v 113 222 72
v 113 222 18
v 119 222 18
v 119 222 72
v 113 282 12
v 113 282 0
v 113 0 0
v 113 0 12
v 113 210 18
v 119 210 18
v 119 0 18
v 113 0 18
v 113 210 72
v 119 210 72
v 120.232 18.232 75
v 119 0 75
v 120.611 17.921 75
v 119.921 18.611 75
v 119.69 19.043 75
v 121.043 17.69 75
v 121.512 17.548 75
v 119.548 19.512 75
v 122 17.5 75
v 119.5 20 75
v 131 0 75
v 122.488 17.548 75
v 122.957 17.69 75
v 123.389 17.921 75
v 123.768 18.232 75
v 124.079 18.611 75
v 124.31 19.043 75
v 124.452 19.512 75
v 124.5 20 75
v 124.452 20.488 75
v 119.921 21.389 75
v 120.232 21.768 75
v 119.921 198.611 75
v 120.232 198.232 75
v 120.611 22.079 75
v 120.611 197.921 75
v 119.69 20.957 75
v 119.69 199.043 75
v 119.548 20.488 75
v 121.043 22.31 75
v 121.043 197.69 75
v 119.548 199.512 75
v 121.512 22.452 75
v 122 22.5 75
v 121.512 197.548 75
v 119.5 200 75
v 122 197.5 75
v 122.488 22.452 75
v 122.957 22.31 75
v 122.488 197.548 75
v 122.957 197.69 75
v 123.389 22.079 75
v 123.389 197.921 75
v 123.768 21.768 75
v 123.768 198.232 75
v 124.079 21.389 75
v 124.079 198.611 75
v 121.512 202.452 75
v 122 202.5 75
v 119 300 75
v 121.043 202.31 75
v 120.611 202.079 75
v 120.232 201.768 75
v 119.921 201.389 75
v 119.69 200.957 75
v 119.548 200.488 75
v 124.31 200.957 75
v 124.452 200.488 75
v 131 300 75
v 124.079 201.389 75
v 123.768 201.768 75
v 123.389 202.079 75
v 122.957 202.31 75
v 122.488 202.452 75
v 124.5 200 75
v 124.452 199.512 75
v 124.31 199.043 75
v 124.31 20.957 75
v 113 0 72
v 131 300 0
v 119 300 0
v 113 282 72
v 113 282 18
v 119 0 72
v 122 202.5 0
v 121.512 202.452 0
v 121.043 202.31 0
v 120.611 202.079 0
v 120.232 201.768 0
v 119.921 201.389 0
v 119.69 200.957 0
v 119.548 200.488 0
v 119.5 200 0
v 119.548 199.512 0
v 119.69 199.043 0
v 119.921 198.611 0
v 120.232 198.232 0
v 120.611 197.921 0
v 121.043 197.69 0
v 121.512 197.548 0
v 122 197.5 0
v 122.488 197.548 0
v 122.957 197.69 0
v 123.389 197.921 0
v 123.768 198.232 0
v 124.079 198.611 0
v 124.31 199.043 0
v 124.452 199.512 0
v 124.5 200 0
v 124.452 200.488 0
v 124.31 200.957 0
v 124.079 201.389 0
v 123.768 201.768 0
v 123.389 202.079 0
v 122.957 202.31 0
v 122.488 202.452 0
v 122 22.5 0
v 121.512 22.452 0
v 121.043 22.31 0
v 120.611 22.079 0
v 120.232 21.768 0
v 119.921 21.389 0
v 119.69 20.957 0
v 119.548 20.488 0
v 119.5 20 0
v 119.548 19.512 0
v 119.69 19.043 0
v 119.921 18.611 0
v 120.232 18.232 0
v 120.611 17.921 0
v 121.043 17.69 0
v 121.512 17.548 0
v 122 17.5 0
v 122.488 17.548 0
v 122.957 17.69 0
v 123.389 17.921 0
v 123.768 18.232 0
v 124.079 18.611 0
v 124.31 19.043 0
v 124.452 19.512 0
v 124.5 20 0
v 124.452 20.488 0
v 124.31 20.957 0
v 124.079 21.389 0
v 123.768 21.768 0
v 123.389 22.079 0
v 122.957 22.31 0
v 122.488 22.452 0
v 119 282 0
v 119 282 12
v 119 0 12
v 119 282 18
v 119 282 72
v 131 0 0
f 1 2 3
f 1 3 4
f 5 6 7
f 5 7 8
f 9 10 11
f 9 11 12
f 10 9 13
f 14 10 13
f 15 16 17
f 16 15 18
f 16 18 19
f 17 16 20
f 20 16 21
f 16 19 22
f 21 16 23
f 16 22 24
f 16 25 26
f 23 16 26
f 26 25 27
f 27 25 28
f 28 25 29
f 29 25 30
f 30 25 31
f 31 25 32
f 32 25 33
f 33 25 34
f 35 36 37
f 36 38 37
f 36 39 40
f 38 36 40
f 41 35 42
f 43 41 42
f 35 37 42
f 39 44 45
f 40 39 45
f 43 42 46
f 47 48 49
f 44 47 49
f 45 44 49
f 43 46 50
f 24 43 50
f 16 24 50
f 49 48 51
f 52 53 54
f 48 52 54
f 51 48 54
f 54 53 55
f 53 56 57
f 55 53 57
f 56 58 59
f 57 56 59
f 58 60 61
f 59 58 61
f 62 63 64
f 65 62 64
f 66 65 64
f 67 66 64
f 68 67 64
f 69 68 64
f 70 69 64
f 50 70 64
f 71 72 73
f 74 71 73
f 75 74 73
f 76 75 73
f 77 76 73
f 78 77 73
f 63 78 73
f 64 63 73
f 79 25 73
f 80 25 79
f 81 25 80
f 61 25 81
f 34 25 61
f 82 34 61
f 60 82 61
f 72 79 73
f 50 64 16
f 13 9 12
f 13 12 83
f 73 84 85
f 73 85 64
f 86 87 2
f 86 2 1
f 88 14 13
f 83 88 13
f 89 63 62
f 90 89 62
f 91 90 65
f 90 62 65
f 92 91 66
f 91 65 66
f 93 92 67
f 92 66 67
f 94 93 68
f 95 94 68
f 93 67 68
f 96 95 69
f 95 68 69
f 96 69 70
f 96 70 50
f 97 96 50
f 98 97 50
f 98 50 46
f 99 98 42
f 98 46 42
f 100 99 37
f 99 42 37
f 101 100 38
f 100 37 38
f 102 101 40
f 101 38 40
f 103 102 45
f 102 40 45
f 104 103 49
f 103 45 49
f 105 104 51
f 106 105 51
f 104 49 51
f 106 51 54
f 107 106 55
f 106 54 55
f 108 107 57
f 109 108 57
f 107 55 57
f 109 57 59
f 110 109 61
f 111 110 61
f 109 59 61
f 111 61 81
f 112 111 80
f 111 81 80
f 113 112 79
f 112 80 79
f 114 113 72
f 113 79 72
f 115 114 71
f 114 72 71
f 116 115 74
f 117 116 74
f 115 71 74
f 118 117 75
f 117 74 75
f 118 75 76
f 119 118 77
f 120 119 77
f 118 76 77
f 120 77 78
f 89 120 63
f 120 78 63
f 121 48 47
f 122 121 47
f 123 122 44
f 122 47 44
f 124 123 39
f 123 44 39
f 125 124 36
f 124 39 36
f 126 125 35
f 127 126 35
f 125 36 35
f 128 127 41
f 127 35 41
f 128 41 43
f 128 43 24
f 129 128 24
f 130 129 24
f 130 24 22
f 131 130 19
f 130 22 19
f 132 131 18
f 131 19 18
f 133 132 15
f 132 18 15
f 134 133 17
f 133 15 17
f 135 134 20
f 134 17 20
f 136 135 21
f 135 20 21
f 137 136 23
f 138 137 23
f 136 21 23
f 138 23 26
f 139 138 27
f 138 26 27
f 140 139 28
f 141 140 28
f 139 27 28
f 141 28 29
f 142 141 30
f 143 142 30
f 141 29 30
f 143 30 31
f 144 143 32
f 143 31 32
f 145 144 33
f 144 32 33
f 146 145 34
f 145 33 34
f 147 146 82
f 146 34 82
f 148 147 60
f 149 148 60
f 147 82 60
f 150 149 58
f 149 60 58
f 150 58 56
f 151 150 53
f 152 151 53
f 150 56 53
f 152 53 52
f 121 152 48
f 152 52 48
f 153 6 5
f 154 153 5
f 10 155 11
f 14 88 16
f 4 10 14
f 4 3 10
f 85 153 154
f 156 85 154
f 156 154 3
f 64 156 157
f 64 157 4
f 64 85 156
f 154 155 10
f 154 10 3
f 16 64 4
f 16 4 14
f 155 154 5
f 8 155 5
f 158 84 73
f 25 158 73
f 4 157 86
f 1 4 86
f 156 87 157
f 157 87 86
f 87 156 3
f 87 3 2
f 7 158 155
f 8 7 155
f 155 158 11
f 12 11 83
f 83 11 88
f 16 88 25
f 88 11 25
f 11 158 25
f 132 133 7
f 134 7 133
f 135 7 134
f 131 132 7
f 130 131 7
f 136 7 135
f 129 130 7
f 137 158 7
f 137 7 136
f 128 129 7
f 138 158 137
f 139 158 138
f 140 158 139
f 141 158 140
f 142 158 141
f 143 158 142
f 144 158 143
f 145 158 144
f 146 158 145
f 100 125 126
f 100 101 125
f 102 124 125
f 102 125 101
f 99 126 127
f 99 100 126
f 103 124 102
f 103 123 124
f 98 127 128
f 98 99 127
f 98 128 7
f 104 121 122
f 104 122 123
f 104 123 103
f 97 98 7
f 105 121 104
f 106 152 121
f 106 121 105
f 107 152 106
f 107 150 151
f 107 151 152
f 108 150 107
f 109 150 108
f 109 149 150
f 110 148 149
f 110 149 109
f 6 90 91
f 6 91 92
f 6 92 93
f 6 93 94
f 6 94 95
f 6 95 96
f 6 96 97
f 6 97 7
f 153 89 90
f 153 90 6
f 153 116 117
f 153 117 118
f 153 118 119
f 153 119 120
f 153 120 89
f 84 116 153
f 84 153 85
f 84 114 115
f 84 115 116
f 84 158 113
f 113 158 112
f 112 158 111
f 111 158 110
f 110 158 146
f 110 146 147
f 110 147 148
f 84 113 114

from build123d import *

# Parameters (mm, degrees)
SKETCH025_W             = 75
SKETCH025_H             = 300
PAD008_DEPTH            = 18
SKETCH026_W             = 75
SKETCH026_H             = 18
SKETCH026_W_2           = 57
SKETCH026_H_2           = 12
POCKET017_DEPTH         = 6
SKETCH027_W             = 6
SKETCH027_H             = 6
SKETCH027_W_2           = 3
POCKET018_DEPTH         = 300
SKETCH032_R             = 2.5
POCKET021_DEPTH         = 75
BODY009_PLACEMENT_ANGLE = 90


with BuildPart() as part:
    # Sketch025 → Pad008 (new body)
    with BuildSketch(Plane.XY):
        with Locations((37.5, 150)):
            Rectangle(SKETCH025_W, SKETCH025_H)
    extrude(amount=PAD008_DEPTH)

    # Sketch026 → Pocket017 (cut)
    with BuildSketch(Plane.XY.offset(18)):
        with Locations((37.5, 291)):
            Rectangle(SKETCH026_W, SKETCH026_H)
        with Locations((46.5, 216)):
            Rectangle(SKETCH026_W_2, SKETCH026_H_2)
    extrude(amount=-POCKET017_DEPTH, mode=Mode.SUBTRACT)

    # Sketch027 → Pocket018 (cut)
    with BuildSketch(Plane.XZ):
        with Locations((15, 15)):
            Rectangle(SKETCH027_W, SKETCH027_H)
        with Locations((73.5, 15)):
            Rectangle(SKETCH027_W_2, SKETCH027_H)
    extrude(amount=-POCKET018_DEPTH, mode=Mode.SUBTRACT)

    # Sketch032 → Pocket021 (cut)
    with BuildSketch(Plane.YZ.offset(75)):
        with Locations((20, 9)):
            Circle(SKETCH032_R)
        with Locations((200, 9)):
            Circle(SKETCH032_R)
    extrude(amount=-POCKET021_DEPTH, mode=Mode.SUBTRACT)


with BuildPart() as part_1:
    # Body009 placement: moved
    add(part.part.moved(Location((131, 0, 0))).rotate(Axis((131, 0, 0), (0, -1, 0)), BODY009_PLACEMENT_ANGLE))


solid = part_1.part
